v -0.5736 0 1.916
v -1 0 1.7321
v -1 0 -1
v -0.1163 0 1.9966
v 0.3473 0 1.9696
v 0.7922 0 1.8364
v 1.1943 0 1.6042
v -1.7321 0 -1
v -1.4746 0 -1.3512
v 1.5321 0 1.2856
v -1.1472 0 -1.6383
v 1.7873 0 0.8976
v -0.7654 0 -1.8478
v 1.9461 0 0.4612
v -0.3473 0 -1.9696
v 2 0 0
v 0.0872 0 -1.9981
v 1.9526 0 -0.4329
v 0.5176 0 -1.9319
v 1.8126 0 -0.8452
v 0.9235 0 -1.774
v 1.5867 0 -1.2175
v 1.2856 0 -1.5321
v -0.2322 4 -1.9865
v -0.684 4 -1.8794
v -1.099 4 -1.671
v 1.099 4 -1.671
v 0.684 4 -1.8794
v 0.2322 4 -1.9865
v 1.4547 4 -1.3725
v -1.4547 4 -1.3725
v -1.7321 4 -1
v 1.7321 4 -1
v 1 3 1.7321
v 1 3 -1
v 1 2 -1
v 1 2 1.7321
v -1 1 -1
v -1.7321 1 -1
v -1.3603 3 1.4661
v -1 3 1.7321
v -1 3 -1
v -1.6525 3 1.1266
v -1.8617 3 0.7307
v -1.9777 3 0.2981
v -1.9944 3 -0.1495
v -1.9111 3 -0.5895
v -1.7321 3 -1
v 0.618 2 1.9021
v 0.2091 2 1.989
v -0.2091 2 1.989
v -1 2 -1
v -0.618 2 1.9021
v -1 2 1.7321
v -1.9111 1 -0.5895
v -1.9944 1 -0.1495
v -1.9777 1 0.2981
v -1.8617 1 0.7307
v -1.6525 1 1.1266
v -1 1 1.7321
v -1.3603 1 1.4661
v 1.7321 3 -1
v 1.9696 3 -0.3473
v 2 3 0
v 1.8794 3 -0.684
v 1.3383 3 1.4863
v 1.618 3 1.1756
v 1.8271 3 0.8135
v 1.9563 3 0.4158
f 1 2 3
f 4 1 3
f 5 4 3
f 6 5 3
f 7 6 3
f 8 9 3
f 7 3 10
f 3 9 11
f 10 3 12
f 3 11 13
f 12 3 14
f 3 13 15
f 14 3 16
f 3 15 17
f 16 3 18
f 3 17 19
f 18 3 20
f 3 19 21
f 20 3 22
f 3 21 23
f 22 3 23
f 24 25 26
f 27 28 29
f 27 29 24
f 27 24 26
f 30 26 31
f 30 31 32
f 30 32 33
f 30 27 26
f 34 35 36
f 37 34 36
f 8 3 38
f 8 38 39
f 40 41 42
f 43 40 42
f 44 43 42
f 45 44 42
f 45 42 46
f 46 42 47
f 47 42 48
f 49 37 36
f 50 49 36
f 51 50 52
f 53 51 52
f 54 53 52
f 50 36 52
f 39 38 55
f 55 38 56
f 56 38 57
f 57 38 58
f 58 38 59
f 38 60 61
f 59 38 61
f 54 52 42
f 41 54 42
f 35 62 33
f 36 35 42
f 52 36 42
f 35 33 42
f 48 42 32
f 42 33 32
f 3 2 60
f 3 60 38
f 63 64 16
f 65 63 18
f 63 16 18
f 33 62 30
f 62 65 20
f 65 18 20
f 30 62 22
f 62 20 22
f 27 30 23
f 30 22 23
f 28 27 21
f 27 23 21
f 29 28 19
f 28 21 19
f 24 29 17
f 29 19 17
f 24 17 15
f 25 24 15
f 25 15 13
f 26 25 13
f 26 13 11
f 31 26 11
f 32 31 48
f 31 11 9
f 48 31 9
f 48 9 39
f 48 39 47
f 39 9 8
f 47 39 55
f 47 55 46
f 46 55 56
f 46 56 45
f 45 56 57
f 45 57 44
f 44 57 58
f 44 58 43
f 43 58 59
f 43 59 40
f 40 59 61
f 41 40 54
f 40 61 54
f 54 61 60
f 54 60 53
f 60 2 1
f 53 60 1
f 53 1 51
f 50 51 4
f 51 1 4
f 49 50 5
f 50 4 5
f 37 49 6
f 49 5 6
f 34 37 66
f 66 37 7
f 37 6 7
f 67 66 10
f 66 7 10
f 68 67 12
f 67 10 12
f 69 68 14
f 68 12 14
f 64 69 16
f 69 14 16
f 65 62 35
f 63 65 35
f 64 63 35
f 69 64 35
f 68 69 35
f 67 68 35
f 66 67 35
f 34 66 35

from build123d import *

# Parameters (mm, degrees)
SKETCH1_R               = 2
BOSS_EXTRUDE1_DEPTH     = 4
CUT_EXTRUDE1_DEPTH      = 3
CUT_EXTRUDE1_DEPTH_BACK = 1
CUT_EXTRUDE9_DEPTH      = 1


with BuildPart() as part:
    # Sketch1 → Boss-Extrude1 (new body)
    with BuildSketch(Plane(origin=(0, 0, 0), x_dir=(1, 0, 0), z_dir=(0, 1, 0))):
        Circle(SKETCH1_R)
    extrude(amount=BOSS_EXTRUDE1_DEPTH)

    # Sketch2 → Cut-Extrude1 (cut, two sides)
    with BuildSketch(Plane.XY) as cut_extrude1_sk:
        Polygon((-2, 4), (2, 4), (2, 3), (1, 3), (1, 2), (-1, 2), (-1, 3), (-2, 3), align=None)
    extrude(amount=CUT_EXTRUDE1_DEPTH, mode=Mode.SUBTRACT)
    extrude(cut_extrude1_sk.sketch, amount=-CUT_EXTRUDE1_DEPTH_BACK, mode=Mode.SUBTRACT)

    # Sketch4 → Cut-Extrude9 (cut)
    with BuildSketch(Plane.XZ):
        with BuildLine():
            Line((-1, 1.732050808), (-1, -1))
            Line((-1, -1), (-1.732050808, -1))
            ThreePointArc((-1.732050808, -1), (-1.931851653, 0.51763809), (-1, 1.732050808))
        make_face()
    extrude(amount=-CUT_EXTRUDE9_DEPTH, mode=Mode.SUBTRACT)


solid = part.part
